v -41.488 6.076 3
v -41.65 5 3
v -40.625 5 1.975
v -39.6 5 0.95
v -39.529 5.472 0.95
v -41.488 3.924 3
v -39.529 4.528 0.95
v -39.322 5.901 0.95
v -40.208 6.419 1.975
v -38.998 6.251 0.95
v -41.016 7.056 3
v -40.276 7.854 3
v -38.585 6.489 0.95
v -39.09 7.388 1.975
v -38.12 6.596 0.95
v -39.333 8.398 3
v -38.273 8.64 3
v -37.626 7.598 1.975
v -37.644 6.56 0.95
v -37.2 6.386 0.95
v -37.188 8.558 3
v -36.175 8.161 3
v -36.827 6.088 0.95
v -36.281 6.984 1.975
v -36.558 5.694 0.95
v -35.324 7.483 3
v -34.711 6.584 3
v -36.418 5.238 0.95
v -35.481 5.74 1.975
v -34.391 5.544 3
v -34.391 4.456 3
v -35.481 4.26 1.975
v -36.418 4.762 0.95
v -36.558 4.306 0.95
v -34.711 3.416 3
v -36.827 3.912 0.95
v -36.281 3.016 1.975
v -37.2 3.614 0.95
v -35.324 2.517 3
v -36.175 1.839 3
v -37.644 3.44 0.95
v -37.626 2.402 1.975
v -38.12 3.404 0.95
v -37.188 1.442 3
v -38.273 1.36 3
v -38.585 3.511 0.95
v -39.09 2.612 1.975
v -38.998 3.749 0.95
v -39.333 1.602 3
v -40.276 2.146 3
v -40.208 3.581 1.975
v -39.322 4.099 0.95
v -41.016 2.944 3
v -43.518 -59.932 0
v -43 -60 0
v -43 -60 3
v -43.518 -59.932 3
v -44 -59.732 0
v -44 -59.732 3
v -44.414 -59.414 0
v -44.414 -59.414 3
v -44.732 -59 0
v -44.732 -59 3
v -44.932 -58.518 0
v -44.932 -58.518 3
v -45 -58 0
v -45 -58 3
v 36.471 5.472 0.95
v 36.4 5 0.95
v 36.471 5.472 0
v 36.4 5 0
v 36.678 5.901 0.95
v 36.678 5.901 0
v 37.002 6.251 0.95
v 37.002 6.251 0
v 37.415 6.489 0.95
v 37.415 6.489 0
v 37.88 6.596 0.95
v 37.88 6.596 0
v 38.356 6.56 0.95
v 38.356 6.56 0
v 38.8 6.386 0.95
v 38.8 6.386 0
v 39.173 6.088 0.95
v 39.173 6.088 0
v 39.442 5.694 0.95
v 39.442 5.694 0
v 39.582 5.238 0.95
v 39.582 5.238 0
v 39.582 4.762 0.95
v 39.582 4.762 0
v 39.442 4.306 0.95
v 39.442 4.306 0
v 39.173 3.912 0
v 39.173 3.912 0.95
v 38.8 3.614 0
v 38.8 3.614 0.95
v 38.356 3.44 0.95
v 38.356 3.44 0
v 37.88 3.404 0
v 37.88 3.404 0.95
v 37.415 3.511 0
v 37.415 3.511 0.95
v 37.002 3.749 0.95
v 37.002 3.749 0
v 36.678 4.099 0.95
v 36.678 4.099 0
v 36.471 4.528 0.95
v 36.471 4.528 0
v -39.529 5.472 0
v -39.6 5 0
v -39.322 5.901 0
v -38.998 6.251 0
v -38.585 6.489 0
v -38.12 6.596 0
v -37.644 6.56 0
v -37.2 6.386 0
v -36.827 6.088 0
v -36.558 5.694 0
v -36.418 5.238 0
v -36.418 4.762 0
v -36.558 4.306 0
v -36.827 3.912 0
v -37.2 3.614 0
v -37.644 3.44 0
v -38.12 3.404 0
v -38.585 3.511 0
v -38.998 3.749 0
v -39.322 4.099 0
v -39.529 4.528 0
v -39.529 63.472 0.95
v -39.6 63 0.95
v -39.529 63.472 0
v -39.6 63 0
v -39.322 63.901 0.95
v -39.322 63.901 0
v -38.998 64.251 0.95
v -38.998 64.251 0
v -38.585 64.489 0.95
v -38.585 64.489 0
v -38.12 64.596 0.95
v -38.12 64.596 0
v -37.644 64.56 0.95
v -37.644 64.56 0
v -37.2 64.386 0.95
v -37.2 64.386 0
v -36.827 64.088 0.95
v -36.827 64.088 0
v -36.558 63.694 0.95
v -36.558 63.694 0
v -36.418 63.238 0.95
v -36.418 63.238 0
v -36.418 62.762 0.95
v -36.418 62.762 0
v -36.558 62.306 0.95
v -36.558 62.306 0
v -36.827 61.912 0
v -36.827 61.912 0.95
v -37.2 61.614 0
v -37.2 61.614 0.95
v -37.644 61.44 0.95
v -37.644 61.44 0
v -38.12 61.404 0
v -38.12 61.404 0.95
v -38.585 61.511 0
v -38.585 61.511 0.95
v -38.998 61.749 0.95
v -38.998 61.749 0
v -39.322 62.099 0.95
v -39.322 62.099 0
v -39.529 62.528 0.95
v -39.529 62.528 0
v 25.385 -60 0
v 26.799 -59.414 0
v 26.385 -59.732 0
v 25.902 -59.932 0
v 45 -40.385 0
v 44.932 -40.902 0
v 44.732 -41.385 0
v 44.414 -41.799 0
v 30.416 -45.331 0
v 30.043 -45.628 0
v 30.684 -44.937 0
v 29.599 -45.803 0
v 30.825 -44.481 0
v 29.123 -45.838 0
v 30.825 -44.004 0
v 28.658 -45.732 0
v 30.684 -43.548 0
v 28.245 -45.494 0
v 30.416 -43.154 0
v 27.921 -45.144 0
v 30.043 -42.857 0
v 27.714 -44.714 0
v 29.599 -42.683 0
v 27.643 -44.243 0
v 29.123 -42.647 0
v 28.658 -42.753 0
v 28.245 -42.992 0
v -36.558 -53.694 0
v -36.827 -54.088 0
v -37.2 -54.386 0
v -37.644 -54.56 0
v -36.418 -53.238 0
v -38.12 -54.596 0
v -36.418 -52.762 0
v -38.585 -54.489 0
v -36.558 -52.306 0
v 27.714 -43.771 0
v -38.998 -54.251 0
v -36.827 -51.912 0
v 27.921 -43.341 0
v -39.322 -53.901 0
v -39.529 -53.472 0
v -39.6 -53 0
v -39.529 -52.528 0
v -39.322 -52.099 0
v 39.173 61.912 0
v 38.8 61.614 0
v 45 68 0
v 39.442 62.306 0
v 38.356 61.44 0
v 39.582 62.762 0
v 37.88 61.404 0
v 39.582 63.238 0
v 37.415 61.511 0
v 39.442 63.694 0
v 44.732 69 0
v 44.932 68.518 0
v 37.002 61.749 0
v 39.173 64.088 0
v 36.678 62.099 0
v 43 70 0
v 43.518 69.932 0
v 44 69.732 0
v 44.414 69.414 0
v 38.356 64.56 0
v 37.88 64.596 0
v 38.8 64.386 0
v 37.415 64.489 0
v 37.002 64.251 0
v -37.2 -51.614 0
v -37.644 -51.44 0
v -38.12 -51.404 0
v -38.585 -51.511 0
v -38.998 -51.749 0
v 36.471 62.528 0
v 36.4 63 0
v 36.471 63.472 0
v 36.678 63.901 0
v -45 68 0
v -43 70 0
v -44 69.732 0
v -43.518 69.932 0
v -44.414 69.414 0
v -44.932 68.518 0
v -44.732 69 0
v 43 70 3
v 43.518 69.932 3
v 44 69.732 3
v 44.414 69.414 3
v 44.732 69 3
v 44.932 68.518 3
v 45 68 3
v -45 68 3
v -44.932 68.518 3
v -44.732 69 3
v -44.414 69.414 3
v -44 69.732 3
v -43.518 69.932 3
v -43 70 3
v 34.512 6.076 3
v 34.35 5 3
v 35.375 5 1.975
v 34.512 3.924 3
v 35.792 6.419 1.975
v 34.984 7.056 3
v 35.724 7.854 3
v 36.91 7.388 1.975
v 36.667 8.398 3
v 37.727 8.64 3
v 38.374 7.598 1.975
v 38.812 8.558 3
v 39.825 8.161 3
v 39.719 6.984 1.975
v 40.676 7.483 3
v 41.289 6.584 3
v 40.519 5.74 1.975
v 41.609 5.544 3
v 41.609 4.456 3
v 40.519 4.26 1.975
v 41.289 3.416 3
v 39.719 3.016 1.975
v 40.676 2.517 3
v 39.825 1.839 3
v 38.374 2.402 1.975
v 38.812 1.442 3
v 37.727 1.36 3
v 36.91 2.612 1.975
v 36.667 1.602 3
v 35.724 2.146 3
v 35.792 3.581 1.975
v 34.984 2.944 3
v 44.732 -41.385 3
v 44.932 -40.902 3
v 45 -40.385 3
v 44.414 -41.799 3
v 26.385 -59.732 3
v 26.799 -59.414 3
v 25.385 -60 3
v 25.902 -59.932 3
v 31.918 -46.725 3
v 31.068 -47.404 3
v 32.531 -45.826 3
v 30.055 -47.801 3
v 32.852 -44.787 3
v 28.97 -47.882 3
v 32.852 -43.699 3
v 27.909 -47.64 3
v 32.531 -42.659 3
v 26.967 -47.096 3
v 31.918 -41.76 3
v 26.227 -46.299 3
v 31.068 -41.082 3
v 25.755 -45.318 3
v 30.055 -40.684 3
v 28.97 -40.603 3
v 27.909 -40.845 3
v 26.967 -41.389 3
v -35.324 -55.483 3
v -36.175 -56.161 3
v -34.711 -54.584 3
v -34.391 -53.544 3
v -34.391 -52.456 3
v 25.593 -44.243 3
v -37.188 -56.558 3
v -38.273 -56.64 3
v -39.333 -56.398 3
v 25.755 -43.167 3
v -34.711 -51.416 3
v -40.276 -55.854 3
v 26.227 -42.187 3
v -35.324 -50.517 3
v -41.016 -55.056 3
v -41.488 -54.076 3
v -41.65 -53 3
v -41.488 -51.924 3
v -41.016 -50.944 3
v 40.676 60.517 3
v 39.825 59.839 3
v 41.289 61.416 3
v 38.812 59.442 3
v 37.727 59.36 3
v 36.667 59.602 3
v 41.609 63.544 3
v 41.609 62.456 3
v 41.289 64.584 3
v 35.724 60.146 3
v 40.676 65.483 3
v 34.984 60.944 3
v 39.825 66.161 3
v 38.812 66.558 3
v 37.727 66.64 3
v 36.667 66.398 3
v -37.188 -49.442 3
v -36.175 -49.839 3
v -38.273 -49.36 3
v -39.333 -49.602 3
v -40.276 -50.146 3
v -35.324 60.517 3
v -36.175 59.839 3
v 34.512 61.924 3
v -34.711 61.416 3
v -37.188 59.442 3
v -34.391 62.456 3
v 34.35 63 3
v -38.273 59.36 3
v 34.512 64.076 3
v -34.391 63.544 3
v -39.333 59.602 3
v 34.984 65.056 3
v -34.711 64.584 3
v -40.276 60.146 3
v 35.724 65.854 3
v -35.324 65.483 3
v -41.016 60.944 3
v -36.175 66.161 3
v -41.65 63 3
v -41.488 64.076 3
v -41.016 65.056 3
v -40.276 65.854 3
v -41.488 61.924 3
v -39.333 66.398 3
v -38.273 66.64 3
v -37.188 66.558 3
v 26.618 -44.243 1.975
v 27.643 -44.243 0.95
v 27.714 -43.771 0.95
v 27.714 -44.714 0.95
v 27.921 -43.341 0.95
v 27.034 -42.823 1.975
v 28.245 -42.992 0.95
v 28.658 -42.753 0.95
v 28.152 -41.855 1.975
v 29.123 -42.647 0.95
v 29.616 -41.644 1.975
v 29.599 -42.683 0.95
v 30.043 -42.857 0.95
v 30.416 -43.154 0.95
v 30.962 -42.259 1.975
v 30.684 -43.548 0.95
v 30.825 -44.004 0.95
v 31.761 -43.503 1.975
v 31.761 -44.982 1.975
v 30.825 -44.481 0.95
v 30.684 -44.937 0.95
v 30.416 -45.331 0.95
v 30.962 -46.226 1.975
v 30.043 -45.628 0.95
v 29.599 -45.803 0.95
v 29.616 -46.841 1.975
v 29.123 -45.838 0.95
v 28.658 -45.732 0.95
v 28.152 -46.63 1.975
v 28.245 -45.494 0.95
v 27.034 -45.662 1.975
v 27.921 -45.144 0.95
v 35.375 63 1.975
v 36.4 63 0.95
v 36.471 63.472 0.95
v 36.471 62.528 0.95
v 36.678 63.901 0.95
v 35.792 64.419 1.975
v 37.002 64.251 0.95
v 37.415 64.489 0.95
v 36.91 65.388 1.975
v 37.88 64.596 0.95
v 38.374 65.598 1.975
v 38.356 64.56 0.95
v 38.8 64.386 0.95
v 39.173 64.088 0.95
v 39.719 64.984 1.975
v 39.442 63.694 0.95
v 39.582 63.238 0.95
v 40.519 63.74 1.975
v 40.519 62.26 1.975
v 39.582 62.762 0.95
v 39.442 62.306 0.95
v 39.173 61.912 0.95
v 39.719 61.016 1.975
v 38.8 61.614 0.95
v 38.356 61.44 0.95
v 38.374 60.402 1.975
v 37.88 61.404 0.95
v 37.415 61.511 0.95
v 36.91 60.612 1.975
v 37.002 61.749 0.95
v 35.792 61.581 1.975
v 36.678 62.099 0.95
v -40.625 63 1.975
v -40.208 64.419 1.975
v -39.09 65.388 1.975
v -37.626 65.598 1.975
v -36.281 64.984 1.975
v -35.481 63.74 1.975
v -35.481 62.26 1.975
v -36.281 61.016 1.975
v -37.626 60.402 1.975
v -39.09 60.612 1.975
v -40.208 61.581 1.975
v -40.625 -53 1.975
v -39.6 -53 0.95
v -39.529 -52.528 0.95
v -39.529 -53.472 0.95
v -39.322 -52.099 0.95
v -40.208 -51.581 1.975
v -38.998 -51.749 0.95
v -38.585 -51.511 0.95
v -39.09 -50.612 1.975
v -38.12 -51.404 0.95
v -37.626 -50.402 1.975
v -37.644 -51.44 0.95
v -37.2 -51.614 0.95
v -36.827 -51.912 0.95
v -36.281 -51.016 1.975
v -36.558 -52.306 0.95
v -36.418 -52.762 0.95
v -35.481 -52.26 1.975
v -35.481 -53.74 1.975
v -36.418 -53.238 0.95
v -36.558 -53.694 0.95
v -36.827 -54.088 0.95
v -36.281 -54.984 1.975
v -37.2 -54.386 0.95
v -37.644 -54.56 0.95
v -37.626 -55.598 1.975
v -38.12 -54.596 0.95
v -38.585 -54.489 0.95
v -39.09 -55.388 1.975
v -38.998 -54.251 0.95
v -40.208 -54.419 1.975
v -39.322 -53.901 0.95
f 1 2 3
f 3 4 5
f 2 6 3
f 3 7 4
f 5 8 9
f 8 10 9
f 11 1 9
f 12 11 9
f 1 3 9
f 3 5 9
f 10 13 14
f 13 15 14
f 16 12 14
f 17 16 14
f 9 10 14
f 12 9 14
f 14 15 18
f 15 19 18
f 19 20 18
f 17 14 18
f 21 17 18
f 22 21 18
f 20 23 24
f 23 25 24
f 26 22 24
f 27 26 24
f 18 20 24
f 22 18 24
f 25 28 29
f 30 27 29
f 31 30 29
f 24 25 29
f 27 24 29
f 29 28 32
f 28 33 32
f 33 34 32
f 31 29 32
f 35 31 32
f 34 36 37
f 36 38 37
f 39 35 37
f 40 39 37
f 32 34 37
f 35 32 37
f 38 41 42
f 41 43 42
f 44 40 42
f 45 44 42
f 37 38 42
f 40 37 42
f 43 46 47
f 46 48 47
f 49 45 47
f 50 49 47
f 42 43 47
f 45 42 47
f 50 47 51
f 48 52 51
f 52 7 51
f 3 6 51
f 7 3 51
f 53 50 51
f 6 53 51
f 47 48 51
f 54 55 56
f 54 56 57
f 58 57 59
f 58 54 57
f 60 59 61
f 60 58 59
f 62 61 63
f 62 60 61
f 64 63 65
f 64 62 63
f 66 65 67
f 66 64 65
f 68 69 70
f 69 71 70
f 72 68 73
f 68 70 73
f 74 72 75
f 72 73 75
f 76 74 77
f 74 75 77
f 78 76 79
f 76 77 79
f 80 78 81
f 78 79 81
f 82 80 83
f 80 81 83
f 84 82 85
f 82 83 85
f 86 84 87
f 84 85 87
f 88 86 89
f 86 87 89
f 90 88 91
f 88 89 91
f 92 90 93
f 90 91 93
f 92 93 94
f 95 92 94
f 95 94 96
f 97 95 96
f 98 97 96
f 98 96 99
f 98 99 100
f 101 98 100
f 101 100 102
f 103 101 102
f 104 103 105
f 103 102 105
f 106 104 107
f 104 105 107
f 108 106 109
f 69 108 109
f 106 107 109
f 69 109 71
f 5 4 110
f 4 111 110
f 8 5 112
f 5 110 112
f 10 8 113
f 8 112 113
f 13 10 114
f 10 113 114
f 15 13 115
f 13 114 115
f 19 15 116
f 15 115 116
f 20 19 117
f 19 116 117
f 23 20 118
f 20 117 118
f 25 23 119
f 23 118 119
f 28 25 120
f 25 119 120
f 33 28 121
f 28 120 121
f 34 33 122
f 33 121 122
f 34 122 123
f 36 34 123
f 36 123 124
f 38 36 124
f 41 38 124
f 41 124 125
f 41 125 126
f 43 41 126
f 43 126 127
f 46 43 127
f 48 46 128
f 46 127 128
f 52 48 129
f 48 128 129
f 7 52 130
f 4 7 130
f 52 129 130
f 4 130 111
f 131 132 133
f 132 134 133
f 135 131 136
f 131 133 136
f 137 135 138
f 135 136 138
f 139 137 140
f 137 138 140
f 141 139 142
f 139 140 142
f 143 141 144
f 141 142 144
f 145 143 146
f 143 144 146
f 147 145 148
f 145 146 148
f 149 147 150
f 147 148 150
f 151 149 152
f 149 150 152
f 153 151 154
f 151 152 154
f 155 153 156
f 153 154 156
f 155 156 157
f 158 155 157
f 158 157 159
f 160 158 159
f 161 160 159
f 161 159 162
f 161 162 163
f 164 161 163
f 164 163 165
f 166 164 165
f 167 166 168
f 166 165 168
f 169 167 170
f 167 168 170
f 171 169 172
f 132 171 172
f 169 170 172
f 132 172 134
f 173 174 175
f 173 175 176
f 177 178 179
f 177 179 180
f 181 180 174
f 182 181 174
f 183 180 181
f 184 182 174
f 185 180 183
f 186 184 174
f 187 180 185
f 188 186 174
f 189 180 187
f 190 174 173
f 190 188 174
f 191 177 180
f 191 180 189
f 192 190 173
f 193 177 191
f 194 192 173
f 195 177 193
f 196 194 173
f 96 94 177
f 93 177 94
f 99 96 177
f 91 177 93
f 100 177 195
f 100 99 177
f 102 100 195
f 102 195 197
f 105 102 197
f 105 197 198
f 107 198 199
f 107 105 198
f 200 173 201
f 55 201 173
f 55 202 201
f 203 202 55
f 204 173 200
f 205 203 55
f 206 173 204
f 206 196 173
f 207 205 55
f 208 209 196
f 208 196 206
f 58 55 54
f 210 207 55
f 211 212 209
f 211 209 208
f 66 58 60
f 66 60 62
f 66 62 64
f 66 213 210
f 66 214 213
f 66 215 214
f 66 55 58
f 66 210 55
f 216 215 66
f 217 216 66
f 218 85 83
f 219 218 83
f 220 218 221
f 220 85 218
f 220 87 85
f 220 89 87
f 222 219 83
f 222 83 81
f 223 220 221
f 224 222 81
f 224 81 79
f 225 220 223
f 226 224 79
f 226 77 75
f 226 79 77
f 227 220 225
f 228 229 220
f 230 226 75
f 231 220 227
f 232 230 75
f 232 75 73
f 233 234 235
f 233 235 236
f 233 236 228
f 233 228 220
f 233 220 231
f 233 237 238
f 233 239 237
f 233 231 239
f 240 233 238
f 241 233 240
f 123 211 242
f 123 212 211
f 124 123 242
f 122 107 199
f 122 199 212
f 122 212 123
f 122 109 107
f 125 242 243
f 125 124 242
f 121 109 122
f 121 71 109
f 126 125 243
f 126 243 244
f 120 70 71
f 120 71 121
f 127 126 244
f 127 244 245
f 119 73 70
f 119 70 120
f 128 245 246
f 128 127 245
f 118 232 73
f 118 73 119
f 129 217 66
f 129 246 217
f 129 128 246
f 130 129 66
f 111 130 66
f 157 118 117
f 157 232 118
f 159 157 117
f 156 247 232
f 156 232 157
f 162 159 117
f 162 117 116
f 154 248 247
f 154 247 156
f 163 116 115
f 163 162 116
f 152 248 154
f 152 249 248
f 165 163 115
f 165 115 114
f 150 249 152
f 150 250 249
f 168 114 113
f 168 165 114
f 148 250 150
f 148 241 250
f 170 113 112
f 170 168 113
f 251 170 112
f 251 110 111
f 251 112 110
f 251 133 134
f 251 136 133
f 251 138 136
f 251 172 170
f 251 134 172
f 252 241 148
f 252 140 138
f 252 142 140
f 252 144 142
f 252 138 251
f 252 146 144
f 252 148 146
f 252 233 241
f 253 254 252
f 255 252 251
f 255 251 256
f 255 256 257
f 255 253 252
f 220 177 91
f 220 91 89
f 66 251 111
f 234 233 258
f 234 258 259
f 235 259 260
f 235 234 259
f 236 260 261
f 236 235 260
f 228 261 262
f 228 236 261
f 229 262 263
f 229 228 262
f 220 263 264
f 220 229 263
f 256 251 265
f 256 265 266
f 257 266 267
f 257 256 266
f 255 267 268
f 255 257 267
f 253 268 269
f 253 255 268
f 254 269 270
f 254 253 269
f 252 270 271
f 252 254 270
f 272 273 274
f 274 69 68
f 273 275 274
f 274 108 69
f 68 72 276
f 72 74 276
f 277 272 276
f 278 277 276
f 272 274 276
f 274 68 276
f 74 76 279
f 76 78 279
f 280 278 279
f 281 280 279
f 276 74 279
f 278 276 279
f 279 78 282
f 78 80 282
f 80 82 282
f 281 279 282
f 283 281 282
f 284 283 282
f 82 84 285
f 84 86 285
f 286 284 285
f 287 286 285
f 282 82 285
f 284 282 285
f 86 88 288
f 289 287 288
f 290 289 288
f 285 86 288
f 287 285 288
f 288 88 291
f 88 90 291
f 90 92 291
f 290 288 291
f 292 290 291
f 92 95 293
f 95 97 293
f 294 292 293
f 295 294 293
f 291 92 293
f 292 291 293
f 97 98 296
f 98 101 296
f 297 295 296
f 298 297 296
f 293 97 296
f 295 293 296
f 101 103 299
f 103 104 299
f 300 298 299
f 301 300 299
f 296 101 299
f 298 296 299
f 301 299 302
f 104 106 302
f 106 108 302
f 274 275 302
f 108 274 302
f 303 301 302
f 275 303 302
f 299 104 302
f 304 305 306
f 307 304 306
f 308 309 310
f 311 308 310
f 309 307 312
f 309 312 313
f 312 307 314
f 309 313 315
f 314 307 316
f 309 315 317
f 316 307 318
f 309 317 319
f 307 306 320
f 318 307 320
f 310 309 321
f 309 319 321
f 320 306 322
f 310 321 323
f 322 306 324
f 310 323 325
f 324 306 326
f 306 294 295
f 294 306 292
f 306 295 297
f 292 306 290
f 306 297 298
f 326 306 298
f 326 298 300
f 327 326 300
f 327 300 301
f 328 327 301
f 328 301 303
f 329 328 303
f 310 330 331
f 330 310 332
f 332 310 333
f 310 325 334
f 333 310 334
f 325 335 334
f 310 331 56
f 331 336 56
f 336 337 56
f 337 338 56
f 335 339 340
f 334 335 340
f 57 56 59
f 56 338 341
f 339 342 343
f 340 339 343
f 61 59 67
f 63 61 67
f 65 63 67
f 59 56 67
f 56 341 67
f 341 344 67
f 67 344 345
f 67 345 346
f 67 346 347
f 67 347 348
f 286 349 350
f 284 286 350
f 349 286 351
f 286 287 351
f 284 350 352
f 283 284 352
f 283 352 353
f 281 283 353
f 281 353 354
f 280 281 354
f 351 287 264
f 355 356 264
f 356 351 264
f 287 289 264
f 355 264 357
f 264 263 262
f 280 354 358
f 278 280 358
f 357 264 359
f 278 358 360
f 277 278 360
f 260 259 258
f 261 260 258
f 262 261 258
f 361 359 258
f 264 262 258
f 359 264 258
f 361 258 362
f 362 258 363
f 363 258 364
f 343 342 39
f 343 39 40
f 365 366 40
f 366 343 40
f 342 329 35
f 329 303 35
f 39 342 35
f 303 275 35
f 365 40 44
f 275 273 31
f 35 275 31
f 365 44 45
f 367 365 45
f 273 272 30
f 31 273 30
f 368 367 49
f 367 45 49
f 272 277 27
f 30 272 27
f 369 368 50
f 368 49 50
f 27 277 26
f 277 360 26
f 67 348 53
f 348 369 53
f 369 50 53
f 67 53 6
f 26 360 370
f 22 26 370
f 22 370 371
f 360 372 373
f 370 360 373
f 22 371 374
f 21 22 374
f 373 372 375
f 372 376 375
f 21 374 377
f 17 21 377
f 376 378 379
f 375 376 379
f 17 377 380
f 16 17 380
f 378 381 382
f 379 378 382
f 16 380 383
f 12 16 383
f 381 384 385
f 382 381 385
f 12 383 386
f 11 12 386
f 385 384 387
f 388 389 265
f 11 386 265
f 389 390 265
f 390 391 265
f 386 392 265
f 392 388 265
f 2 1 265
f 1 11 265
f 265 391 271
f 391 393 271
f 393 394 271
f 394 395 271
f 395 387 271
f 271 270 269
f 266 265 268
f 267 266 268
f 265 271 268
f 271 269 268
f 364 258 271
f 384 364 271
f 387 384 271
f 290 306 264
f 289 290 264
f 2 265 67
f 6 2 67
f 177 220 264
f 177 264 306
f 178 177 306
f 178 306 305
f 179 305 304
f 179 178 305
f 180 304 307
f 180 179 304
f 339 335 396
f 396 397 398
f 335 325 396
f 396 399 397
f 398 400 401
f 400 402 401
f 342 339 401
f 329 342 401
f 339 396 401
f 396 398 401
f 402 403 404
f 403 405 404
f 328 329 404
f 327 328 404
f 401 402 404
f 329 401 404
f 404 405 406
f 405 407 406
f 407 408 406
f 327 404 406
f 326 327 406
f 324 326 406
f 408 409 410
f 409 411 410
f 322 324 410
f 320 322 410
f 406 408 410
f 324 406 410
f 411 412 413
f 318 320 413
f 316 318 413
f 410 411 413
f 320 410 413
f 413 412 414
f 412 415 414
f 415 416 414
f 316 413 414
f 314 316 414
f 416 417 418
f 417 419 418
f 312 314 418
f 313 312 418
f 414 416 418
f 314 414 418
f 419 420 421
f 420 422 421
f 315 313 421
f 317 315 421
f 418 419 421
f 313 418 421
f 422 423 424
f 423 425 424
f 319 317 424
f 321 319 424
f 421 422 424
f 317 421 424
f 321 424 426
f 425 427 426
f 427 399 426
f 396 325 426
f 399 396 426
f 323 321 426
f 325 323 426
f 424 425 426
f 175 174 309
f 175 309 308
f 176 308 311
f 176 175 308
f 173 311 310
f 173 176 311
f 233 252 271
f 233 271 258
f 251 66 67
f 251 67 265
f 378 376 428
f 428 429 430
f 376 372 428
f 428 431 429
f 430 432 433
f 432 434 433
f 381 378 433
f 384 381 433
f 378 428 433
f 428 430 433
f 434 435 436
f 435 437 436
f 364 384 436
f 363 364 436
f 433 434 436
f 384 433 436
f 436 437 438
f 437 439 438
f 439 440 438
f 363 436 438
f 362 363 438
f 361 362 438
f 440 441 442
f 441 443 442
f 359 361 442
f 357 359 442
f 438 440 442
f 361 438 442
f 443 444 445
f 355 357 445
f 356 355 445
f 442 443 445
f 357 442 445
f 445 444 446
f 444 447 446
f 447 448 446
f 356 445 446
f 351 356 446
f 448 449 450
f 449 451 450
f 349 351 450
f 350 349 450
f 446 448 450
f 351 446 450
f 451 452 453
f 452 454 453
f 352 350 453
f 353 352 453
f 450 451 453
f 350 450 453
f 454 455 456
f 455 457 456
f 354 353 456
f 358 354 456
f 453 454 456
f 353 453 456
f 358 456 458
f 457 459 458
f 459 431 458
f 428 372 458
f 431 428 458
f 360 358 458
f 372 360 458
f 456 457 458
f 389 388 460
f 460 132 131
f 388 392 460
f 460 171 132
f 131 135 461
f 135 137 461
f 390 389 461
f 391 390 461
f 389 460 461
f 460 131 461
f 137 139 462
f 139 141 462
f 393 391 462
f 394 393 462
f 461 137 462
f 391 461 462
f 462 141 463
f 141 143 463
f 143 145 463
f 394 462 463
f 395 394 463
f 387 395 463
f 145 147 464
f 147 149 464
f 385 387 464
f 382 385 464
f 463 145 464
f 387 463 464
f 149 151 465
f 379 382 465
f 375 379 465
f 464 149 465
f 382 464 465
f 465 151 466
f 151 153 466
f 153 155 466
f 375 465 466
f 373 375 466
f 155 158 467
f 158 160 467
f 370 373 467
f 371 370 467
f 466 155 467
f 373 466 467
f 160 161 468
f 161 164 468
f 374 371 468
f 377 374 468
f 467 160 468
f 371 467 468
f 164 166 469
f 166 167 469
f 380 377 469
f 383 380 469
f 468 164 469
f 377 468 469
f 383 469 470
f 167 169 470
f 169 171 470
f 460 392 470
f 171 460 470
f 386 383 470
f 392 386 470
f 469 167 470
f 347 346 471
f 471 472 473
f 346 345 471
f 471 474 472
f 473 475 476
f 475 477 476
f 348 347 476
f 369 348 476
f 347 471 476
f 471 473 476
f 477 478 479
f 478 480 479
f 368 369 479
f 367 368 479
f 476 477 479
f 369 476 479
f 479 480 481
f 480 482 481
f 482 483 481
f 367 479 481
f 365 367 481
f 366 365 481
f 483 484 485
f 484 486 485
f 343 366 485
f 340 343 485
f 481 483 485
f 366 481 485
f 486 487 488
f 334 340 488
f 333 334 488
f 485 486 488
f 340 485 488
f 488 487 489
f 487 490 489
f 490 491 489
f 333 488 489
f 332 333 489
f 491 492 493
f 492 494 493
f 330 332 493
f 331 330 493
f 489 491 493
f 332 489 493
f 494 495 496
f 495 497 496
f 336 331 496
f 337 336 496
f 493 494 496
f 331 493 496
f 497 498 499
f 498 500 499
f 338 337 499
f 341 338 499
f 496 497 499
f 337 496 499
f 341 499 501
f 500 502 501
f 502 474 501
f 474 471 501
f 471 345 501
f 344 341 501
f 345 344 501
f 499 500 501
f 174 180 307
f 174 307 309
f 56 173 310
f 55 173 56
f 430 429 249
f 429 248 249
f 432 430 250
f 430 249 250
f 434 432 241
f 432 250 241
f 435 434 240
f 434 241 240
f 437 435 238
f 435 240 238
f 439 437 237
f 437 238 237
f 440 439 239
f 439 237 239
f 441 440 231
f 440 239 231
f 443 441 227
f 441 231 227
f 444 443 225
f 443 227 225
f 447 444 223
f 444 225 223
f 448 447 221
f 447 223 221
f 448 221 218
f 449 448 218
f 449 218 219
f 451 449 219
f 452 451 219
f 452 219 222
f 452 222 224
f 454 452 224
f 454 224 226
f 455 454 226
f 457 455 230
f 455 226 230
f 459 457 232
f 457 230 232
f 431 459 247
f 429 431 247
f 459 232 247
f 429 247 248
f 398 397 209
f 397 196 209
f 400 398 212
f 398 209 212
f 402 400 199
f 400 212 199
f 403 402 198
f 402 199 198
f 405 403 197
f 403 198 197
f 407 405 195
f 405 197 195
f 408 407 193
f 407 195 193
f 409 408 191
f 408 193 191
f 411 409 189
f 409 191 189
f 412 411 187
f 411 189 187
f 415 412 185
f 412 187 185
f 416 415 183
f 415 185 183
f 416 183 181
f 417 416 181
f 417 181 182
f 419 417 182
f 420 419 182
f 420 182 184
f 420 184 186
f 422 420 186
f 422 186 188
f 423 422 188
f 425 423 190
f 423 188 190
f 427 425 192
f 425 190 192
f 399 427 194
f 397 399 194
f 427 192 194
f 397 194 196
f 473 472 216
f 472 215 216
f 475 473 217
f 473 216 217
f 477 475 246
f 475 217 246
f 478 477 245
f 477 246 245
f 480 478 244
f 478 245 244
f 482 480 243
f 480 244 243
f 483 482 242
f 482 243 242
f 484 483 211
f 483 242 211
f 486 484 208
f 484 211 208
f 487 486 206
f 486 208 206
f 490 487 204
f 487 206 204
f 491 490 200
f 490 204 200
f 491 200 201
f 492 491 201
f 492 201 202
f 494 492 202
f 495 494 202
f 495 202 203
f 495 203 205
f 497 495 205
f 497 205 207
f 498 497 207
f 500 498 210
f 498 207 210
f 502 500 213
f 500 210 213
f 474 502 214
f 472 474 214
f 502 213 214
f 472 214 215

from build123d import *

# Parameters (mm, degrees)
BOSS_EXTRUDE1_DEPTH                                 = 3
CSK_FOR_M3_COUNTERSUNK_FLAT_HEAD_SCREW1_D           = 3.2
CSK_FOR_M3_COUNTERSUNK_FLAT_HEAD_SCREW1_DEPTH       = 5
CSK_FOR_M3_COUNTERSUNK_FLAT_HEAD_SCREW1_CSINK_D     = 7.3
CSK_FOR_M3_COUNTERSUNK_FLAT_HEAD_SCREW1_CSINK_ANGLE = 90
CSK_FOR_M3_COUNTERSUNK_FLAT_HEAD_SCREW1_TIP         = 0.96137699


with BuildPart() as part:
    # Sketch1 → Boss-Extrude1 (new body)
    with BuildSketch(Plane.XY):
        with BuildLine():
            Line((-43, 70), (43, 70))
            ThreePointArc((43, 70), (44.414213562, 69.414213562), (45, 68))
            Line((45, 68), (45, -40.384776311))
            ThreePointArc((45, -40.384776311), (44.847759065, -41.150143176), (44.414213562, -41.798989873))
            Line((44.414213562, -41.798989873), (26.798989873, -59.414213562))
            ThreePointArc((26.798989873, -59.414213562), (26.150143176, -59.847759065), (25.384776311, -60))
            Line((25.384776311, -60), (-43, -60))
            ThreePointArc((-43, -60), (-44.414213562, -59.414213562), (-45, -58))
            Line((-45, -58), (-45, 68))
            ThreePointArc((-45, 68), (-44.414213562, 69.414213562), (-43, 70))
        make_face()
    extrude(amount=BOSS_EXTRUDE1_DEPTH)

    # CSK for M3 Countersunk Flat Head Screw1
    with Locations(Plane(origin=(-38, -53, 3), x_dir=(1, 0, 0), z_dir=(0, 0, 1))):
        with Locations((0, 0), (67.242640687, 8.757359313), (76, 58), (0, 58), (0, 116), (76, 116)):
            CounterSinkHole(CSK_FOR_M3_COUNTERSUNK_FLAT_HEAD_SCREW1_D / 2, CSK_FOR_M3_COUNTERSUNK_FLAT_HEAD_SCREW1_CSINK_D / 2, depth=CSK_FOR_M3_COUNTERSUNK_FLAT_HEAD_SCREW1_DEPTH, counter_sink_angle=CSK_FOR_M3_COUNTERSUNK_FLAT_HEAD_SCREW1_CSINK_ANGLE)
            with Locations((0, 0, -(CSK_FOR_M3_COUNTERSUNK_FLAT_HEAD_SCREW1_DEPTH + CSK_FOR_M3_COUNTERSUNK_FLAT_HEAD_SCREW1_TIP / 2))):  # 118° drill point
                Cone(0, CSK_FOR_M3_COUNTERSUNK_FLAT_HEAD_SCREW1_D / 2, CSK_FOR_M3_COUNTERSUNK_FLAT_HEAD_SCREW1_TIP, mode=Mode.SUBTRACT)


solid = part.part
